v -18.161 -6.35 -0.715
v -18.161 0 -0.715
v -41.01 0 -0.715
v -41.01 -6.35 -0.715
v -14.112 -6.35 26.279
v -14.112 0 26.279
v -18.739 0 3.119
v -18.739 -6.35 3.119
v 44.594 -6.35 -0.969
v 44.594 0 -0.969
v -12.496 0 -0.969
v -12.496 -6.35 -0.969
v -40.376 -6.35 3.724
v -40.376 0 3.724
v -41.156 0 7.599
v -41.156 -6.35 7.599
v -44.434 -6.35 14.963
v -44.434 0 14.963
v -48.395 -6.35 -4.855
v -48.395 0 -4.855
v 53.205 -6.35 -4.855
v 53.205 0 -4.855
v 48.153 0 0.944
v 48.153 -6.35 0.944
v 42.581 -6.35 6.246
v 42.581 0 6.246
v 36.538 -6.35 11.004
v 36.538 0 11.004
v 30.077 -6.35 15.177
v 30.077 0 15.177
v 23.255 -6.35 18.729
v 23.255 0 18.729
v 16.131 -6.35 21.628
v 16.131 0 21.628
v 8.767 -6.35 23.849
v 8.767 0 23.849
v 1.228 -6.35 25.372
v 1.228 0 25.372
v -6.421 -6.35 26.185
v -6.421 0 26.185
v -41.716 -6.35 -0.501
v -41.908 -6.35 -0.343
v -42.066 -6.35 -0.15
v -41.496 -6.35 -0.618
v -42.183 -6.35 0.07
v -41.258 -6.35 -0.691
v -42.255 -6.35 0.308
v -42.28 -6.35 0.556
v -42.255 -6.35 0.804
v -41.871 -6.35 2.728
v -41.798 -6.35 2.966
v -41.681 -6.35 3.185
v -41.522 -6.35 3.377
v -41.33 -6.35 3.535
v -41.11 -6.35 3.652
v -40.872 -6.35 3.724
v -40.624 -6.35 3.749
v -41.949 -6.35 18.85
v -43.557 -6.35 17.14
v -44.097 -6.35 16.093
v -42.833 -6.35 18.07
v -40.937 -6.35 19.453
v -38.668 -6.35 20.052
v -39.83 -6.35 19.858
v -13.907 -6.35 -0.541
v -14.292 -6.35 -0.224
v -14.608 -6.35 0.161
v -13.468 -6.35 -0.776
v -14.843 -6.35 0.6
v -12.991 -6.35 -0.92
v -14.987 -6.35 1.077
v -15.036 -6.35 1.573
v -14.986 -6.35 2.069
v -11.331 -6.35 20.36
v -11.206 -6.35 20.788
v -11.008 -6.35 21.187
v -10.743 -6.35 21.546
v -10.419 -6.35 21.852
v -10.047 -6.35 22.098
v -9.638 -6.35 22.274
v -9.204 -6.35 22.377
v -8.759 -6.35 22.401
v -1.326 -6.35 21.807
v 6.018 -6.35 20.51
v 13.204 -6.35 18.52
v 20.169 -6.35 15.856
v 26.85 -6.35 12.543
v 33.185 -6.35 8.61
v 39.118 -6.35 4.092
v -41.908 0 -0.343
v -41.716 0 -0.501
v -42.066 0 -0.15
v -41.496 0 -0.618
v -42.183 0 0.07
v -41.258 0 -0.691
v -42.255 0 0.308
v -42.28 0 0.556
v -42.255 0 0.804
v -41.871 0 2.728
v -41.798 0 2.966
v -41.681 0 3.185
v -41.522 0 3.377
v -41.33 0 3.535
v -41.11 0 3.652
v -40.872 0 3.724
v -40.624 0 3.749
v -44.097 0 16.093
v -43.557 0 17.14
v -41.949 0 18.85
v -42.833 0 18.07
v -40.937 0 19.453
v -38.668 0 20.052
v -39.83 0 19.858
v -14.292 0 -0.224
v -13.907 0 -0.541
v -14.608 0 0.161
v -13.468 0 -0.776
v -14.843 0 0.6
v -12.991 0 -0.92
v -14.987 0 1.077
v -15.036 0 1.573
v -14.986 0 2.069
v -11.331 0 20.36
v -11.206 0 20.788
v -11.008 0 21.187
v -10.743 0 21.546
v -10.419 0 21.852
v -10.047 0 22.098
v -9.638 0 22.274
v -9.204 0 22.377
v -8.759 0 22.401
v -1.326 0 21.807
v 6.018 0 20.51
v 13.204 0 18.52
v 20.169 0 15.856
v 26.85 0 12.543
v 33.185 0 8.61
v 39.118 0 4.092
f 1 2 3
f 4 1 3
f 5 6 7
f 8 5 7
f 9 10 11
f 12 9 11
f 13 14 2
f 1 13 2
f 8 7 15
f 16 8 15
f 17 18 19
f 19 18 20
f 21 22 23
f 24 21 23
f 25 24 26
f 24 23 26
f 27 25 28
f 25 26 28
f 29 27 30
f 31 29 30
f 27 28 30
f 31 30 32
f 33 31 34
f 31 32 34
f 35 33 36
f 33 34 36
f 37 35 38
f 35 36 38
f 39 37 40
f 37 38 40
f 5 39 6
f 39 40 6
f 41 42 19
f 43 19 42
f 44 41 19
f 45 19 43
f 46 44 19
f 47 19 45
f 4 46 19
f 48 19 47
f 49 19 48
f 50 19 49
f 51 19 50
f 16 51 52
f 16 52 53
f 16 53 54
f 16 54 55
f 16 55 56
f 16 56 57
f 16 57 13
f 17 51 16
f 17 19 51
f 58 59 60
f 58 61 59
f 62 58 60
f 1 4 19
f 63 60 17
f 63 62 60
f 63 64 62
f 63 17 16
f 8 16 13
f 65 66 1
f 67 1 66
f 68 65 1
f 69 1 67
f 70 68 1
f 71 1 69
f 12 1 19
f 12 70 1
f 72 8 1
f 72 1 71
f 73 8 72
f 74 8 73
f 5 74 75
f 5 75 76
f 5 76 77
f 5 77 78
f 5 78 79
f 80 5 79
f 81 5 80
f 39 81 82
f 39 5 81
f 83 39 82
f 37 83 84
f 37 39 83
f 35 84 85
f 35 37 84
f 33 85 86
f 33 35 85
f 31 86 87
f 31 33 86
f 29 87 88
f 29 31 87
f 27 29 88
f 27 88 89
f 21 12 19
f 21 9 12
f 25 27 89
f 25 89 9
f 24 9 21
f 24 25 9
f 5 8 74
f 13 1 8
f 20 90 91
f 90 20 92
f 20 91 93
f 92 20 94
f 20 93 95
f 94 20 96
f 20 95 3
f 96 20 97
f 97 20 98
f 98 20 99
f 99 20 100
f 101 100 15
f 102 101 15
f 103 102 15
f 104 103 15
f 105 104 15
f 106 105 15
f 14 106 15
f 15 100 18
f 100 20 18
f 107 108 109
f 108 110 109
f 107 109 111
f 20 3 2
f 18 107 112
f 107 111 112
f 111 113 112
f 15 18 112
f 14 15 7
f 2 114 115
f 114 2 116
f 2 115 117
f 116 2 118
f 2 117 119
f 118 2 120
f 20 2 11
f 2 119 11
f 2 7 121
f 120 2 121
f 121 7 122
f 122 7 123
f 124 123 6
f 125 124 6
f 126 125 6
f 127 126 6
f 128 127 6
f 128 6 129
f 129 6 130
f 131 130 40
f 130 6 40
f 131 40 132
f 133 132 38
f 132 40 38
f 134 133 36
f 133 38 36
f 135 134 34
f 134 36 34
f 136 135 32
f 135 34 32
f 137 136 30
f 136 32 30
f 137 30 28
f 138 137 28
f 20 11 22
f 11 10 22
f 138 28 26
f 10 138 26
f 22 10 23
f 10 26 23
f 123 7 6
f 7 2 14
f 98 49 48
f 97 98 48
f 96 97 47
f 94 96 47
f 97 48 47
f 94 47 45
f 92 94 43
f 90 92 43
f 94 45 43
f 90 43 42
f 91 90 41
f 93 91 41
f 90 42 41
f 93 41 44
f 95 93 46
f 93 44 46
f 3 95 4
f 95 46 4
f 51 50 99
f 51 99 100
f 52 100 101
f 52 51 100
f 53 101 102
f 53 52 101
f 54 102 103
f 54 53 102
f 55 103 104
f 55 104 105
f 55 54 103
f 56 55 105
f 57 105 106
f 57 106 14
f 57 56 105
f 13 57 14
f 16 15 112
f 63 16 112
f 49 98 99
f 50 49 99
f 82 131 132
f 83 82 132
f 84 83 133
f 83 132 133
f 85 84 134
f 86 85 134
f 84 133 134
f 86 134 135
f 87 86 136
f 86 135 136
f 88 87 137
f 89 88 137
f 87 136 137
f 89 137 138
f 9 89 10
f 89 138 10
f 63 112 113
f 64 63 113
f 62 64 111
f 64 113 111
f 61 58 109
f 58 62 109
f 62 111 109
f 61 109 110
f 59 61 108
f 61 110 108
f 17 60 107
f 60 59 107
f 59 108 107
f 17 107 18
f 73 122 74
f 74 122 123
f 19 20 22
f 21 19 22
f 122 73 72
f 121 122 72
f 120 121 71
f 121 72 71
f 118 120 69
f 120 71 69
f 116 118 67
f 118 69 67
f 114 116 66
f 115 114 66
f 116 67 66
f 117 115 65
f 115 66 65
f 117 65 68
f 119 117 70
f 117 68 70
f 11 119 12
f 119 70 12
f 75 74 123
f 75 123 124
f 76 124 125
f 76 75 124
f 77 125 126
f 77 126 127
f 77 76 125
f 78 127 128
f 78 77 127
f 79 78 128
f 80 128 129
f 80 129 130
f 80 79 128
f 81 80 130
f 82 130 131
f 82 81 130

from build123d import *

# Parameters (mm, degrees)
F1_DEPTH    = 76.2
F2_R        = 2.54
F3_R        = 1.27
F4_T1_DEPTH = 102.1482316142
F5_DEPTH    = 69.85


# Not quite as in the source:
# - a fillet or chamfer that OpenCascade refuses, or shapes differently, is made with other operations: its cross-section is extruded or revolved along the edge and cut away or added


with BuildPart() as f1:
    # F0 (on Front) → F1 (new body)
    with BuildSketch(Plane.XZ):
        with BuildLine():
            Line((-38.6677846295, 20.0523413639), (-43.4175846295, 20.0523413639))
            Line((-43.4175846295, 20.0523413639), (-48.3946166933, -4.8552709632))
            Line((-48.3946166933, -4.8552709632), (53.2053833067, -4.8552709632))
            ThreePointArc((53.2053833067, -4.8552709632), (23.2548005589, 18.7290020933), (-14.1116172914, 26.2792444457))
            Line((-14.1116172914, 26.2792444457), (-18.739449567, 3.119206343))
            Line((-18.739449567, 3.119206343), (-41.1563006614, 7.5985352004))
            Line((-41.1563006614, 7.5985352004), (-38.6677846295, 20.0523413639))
        make_face()
        Polygon((-41.6217533096, 3.9728981134), (-18.1607622718, -0.7150704927), (-42.558501873, -0.7150704927), align=None, mode=Mode.SUBTRACT)
        with BuildLine():
            ThreePointArc((-10.9155429452, 22.4410306257), (19.1784355797, 16.2823947845), (44.5942434068, -0.9690704107))
            Line((44.5942434068, -0.9690704107), (-15.5933427256, -0.9690704107))
            Line((-15.5933427256, -0.9690704107), (-10.9155429452, 22.4410306257))
        make_face(mode=Mode.SUBTRACT)
    extrude(amount=F1_DEPTH)

    # F2
    f2_edges = [f1.edges().sort_by_distance(p)[0] for p in [
        (-10.915543, -38.1, 22.441031),
        (-15.593343, -38.1, -0.96907),
    ]]
    fillet(f2_edges, radius=F2_R)

    # F3
    f3_edges = [f1.edges().sort_by_distance(p)[0] for p in [
        (-41.621753, -38.1, 3.972898),
        (-42.558502, -38.1, -0.71507),
    ]]
    fillet(f3_edges, radius=F3_R)

    # F4: fillet of radius 6.35 on 1 edges, made by hand

    # F4_s2 → F4_t1 (cut)
    with BuildSketch(Plane.XZ.offset(-12.9741158071)):
        with BuildLine():
            ThreePointArc((-38.6677846295, 20.0523413639), (-42.4092351432, 18.4801883775), (-44.4344758164, 14.9632981071))
            Line((-44.4344758164, 14.9632981071), (-43.4175846295, 20.0523413639))
            Line((-43.4175846295, 20.0523413639), (-38.6677846295, 20.0523413639))
        make_face()
    extrude(amount=F4_T1_DEPTH, mode=Mode.SUBTRACT)

    # F5 (cut): a face of the model
    f5_faces = [f1.faces().sort_by_distance(p)[0] for p in [
        (-45.3723710361, -76.2, 4.845766414),
    ]]
    extrude(f5_faces, amount=-F5_DEPTH, mode=Mode.SUBTRACT)


solid = f1.part
